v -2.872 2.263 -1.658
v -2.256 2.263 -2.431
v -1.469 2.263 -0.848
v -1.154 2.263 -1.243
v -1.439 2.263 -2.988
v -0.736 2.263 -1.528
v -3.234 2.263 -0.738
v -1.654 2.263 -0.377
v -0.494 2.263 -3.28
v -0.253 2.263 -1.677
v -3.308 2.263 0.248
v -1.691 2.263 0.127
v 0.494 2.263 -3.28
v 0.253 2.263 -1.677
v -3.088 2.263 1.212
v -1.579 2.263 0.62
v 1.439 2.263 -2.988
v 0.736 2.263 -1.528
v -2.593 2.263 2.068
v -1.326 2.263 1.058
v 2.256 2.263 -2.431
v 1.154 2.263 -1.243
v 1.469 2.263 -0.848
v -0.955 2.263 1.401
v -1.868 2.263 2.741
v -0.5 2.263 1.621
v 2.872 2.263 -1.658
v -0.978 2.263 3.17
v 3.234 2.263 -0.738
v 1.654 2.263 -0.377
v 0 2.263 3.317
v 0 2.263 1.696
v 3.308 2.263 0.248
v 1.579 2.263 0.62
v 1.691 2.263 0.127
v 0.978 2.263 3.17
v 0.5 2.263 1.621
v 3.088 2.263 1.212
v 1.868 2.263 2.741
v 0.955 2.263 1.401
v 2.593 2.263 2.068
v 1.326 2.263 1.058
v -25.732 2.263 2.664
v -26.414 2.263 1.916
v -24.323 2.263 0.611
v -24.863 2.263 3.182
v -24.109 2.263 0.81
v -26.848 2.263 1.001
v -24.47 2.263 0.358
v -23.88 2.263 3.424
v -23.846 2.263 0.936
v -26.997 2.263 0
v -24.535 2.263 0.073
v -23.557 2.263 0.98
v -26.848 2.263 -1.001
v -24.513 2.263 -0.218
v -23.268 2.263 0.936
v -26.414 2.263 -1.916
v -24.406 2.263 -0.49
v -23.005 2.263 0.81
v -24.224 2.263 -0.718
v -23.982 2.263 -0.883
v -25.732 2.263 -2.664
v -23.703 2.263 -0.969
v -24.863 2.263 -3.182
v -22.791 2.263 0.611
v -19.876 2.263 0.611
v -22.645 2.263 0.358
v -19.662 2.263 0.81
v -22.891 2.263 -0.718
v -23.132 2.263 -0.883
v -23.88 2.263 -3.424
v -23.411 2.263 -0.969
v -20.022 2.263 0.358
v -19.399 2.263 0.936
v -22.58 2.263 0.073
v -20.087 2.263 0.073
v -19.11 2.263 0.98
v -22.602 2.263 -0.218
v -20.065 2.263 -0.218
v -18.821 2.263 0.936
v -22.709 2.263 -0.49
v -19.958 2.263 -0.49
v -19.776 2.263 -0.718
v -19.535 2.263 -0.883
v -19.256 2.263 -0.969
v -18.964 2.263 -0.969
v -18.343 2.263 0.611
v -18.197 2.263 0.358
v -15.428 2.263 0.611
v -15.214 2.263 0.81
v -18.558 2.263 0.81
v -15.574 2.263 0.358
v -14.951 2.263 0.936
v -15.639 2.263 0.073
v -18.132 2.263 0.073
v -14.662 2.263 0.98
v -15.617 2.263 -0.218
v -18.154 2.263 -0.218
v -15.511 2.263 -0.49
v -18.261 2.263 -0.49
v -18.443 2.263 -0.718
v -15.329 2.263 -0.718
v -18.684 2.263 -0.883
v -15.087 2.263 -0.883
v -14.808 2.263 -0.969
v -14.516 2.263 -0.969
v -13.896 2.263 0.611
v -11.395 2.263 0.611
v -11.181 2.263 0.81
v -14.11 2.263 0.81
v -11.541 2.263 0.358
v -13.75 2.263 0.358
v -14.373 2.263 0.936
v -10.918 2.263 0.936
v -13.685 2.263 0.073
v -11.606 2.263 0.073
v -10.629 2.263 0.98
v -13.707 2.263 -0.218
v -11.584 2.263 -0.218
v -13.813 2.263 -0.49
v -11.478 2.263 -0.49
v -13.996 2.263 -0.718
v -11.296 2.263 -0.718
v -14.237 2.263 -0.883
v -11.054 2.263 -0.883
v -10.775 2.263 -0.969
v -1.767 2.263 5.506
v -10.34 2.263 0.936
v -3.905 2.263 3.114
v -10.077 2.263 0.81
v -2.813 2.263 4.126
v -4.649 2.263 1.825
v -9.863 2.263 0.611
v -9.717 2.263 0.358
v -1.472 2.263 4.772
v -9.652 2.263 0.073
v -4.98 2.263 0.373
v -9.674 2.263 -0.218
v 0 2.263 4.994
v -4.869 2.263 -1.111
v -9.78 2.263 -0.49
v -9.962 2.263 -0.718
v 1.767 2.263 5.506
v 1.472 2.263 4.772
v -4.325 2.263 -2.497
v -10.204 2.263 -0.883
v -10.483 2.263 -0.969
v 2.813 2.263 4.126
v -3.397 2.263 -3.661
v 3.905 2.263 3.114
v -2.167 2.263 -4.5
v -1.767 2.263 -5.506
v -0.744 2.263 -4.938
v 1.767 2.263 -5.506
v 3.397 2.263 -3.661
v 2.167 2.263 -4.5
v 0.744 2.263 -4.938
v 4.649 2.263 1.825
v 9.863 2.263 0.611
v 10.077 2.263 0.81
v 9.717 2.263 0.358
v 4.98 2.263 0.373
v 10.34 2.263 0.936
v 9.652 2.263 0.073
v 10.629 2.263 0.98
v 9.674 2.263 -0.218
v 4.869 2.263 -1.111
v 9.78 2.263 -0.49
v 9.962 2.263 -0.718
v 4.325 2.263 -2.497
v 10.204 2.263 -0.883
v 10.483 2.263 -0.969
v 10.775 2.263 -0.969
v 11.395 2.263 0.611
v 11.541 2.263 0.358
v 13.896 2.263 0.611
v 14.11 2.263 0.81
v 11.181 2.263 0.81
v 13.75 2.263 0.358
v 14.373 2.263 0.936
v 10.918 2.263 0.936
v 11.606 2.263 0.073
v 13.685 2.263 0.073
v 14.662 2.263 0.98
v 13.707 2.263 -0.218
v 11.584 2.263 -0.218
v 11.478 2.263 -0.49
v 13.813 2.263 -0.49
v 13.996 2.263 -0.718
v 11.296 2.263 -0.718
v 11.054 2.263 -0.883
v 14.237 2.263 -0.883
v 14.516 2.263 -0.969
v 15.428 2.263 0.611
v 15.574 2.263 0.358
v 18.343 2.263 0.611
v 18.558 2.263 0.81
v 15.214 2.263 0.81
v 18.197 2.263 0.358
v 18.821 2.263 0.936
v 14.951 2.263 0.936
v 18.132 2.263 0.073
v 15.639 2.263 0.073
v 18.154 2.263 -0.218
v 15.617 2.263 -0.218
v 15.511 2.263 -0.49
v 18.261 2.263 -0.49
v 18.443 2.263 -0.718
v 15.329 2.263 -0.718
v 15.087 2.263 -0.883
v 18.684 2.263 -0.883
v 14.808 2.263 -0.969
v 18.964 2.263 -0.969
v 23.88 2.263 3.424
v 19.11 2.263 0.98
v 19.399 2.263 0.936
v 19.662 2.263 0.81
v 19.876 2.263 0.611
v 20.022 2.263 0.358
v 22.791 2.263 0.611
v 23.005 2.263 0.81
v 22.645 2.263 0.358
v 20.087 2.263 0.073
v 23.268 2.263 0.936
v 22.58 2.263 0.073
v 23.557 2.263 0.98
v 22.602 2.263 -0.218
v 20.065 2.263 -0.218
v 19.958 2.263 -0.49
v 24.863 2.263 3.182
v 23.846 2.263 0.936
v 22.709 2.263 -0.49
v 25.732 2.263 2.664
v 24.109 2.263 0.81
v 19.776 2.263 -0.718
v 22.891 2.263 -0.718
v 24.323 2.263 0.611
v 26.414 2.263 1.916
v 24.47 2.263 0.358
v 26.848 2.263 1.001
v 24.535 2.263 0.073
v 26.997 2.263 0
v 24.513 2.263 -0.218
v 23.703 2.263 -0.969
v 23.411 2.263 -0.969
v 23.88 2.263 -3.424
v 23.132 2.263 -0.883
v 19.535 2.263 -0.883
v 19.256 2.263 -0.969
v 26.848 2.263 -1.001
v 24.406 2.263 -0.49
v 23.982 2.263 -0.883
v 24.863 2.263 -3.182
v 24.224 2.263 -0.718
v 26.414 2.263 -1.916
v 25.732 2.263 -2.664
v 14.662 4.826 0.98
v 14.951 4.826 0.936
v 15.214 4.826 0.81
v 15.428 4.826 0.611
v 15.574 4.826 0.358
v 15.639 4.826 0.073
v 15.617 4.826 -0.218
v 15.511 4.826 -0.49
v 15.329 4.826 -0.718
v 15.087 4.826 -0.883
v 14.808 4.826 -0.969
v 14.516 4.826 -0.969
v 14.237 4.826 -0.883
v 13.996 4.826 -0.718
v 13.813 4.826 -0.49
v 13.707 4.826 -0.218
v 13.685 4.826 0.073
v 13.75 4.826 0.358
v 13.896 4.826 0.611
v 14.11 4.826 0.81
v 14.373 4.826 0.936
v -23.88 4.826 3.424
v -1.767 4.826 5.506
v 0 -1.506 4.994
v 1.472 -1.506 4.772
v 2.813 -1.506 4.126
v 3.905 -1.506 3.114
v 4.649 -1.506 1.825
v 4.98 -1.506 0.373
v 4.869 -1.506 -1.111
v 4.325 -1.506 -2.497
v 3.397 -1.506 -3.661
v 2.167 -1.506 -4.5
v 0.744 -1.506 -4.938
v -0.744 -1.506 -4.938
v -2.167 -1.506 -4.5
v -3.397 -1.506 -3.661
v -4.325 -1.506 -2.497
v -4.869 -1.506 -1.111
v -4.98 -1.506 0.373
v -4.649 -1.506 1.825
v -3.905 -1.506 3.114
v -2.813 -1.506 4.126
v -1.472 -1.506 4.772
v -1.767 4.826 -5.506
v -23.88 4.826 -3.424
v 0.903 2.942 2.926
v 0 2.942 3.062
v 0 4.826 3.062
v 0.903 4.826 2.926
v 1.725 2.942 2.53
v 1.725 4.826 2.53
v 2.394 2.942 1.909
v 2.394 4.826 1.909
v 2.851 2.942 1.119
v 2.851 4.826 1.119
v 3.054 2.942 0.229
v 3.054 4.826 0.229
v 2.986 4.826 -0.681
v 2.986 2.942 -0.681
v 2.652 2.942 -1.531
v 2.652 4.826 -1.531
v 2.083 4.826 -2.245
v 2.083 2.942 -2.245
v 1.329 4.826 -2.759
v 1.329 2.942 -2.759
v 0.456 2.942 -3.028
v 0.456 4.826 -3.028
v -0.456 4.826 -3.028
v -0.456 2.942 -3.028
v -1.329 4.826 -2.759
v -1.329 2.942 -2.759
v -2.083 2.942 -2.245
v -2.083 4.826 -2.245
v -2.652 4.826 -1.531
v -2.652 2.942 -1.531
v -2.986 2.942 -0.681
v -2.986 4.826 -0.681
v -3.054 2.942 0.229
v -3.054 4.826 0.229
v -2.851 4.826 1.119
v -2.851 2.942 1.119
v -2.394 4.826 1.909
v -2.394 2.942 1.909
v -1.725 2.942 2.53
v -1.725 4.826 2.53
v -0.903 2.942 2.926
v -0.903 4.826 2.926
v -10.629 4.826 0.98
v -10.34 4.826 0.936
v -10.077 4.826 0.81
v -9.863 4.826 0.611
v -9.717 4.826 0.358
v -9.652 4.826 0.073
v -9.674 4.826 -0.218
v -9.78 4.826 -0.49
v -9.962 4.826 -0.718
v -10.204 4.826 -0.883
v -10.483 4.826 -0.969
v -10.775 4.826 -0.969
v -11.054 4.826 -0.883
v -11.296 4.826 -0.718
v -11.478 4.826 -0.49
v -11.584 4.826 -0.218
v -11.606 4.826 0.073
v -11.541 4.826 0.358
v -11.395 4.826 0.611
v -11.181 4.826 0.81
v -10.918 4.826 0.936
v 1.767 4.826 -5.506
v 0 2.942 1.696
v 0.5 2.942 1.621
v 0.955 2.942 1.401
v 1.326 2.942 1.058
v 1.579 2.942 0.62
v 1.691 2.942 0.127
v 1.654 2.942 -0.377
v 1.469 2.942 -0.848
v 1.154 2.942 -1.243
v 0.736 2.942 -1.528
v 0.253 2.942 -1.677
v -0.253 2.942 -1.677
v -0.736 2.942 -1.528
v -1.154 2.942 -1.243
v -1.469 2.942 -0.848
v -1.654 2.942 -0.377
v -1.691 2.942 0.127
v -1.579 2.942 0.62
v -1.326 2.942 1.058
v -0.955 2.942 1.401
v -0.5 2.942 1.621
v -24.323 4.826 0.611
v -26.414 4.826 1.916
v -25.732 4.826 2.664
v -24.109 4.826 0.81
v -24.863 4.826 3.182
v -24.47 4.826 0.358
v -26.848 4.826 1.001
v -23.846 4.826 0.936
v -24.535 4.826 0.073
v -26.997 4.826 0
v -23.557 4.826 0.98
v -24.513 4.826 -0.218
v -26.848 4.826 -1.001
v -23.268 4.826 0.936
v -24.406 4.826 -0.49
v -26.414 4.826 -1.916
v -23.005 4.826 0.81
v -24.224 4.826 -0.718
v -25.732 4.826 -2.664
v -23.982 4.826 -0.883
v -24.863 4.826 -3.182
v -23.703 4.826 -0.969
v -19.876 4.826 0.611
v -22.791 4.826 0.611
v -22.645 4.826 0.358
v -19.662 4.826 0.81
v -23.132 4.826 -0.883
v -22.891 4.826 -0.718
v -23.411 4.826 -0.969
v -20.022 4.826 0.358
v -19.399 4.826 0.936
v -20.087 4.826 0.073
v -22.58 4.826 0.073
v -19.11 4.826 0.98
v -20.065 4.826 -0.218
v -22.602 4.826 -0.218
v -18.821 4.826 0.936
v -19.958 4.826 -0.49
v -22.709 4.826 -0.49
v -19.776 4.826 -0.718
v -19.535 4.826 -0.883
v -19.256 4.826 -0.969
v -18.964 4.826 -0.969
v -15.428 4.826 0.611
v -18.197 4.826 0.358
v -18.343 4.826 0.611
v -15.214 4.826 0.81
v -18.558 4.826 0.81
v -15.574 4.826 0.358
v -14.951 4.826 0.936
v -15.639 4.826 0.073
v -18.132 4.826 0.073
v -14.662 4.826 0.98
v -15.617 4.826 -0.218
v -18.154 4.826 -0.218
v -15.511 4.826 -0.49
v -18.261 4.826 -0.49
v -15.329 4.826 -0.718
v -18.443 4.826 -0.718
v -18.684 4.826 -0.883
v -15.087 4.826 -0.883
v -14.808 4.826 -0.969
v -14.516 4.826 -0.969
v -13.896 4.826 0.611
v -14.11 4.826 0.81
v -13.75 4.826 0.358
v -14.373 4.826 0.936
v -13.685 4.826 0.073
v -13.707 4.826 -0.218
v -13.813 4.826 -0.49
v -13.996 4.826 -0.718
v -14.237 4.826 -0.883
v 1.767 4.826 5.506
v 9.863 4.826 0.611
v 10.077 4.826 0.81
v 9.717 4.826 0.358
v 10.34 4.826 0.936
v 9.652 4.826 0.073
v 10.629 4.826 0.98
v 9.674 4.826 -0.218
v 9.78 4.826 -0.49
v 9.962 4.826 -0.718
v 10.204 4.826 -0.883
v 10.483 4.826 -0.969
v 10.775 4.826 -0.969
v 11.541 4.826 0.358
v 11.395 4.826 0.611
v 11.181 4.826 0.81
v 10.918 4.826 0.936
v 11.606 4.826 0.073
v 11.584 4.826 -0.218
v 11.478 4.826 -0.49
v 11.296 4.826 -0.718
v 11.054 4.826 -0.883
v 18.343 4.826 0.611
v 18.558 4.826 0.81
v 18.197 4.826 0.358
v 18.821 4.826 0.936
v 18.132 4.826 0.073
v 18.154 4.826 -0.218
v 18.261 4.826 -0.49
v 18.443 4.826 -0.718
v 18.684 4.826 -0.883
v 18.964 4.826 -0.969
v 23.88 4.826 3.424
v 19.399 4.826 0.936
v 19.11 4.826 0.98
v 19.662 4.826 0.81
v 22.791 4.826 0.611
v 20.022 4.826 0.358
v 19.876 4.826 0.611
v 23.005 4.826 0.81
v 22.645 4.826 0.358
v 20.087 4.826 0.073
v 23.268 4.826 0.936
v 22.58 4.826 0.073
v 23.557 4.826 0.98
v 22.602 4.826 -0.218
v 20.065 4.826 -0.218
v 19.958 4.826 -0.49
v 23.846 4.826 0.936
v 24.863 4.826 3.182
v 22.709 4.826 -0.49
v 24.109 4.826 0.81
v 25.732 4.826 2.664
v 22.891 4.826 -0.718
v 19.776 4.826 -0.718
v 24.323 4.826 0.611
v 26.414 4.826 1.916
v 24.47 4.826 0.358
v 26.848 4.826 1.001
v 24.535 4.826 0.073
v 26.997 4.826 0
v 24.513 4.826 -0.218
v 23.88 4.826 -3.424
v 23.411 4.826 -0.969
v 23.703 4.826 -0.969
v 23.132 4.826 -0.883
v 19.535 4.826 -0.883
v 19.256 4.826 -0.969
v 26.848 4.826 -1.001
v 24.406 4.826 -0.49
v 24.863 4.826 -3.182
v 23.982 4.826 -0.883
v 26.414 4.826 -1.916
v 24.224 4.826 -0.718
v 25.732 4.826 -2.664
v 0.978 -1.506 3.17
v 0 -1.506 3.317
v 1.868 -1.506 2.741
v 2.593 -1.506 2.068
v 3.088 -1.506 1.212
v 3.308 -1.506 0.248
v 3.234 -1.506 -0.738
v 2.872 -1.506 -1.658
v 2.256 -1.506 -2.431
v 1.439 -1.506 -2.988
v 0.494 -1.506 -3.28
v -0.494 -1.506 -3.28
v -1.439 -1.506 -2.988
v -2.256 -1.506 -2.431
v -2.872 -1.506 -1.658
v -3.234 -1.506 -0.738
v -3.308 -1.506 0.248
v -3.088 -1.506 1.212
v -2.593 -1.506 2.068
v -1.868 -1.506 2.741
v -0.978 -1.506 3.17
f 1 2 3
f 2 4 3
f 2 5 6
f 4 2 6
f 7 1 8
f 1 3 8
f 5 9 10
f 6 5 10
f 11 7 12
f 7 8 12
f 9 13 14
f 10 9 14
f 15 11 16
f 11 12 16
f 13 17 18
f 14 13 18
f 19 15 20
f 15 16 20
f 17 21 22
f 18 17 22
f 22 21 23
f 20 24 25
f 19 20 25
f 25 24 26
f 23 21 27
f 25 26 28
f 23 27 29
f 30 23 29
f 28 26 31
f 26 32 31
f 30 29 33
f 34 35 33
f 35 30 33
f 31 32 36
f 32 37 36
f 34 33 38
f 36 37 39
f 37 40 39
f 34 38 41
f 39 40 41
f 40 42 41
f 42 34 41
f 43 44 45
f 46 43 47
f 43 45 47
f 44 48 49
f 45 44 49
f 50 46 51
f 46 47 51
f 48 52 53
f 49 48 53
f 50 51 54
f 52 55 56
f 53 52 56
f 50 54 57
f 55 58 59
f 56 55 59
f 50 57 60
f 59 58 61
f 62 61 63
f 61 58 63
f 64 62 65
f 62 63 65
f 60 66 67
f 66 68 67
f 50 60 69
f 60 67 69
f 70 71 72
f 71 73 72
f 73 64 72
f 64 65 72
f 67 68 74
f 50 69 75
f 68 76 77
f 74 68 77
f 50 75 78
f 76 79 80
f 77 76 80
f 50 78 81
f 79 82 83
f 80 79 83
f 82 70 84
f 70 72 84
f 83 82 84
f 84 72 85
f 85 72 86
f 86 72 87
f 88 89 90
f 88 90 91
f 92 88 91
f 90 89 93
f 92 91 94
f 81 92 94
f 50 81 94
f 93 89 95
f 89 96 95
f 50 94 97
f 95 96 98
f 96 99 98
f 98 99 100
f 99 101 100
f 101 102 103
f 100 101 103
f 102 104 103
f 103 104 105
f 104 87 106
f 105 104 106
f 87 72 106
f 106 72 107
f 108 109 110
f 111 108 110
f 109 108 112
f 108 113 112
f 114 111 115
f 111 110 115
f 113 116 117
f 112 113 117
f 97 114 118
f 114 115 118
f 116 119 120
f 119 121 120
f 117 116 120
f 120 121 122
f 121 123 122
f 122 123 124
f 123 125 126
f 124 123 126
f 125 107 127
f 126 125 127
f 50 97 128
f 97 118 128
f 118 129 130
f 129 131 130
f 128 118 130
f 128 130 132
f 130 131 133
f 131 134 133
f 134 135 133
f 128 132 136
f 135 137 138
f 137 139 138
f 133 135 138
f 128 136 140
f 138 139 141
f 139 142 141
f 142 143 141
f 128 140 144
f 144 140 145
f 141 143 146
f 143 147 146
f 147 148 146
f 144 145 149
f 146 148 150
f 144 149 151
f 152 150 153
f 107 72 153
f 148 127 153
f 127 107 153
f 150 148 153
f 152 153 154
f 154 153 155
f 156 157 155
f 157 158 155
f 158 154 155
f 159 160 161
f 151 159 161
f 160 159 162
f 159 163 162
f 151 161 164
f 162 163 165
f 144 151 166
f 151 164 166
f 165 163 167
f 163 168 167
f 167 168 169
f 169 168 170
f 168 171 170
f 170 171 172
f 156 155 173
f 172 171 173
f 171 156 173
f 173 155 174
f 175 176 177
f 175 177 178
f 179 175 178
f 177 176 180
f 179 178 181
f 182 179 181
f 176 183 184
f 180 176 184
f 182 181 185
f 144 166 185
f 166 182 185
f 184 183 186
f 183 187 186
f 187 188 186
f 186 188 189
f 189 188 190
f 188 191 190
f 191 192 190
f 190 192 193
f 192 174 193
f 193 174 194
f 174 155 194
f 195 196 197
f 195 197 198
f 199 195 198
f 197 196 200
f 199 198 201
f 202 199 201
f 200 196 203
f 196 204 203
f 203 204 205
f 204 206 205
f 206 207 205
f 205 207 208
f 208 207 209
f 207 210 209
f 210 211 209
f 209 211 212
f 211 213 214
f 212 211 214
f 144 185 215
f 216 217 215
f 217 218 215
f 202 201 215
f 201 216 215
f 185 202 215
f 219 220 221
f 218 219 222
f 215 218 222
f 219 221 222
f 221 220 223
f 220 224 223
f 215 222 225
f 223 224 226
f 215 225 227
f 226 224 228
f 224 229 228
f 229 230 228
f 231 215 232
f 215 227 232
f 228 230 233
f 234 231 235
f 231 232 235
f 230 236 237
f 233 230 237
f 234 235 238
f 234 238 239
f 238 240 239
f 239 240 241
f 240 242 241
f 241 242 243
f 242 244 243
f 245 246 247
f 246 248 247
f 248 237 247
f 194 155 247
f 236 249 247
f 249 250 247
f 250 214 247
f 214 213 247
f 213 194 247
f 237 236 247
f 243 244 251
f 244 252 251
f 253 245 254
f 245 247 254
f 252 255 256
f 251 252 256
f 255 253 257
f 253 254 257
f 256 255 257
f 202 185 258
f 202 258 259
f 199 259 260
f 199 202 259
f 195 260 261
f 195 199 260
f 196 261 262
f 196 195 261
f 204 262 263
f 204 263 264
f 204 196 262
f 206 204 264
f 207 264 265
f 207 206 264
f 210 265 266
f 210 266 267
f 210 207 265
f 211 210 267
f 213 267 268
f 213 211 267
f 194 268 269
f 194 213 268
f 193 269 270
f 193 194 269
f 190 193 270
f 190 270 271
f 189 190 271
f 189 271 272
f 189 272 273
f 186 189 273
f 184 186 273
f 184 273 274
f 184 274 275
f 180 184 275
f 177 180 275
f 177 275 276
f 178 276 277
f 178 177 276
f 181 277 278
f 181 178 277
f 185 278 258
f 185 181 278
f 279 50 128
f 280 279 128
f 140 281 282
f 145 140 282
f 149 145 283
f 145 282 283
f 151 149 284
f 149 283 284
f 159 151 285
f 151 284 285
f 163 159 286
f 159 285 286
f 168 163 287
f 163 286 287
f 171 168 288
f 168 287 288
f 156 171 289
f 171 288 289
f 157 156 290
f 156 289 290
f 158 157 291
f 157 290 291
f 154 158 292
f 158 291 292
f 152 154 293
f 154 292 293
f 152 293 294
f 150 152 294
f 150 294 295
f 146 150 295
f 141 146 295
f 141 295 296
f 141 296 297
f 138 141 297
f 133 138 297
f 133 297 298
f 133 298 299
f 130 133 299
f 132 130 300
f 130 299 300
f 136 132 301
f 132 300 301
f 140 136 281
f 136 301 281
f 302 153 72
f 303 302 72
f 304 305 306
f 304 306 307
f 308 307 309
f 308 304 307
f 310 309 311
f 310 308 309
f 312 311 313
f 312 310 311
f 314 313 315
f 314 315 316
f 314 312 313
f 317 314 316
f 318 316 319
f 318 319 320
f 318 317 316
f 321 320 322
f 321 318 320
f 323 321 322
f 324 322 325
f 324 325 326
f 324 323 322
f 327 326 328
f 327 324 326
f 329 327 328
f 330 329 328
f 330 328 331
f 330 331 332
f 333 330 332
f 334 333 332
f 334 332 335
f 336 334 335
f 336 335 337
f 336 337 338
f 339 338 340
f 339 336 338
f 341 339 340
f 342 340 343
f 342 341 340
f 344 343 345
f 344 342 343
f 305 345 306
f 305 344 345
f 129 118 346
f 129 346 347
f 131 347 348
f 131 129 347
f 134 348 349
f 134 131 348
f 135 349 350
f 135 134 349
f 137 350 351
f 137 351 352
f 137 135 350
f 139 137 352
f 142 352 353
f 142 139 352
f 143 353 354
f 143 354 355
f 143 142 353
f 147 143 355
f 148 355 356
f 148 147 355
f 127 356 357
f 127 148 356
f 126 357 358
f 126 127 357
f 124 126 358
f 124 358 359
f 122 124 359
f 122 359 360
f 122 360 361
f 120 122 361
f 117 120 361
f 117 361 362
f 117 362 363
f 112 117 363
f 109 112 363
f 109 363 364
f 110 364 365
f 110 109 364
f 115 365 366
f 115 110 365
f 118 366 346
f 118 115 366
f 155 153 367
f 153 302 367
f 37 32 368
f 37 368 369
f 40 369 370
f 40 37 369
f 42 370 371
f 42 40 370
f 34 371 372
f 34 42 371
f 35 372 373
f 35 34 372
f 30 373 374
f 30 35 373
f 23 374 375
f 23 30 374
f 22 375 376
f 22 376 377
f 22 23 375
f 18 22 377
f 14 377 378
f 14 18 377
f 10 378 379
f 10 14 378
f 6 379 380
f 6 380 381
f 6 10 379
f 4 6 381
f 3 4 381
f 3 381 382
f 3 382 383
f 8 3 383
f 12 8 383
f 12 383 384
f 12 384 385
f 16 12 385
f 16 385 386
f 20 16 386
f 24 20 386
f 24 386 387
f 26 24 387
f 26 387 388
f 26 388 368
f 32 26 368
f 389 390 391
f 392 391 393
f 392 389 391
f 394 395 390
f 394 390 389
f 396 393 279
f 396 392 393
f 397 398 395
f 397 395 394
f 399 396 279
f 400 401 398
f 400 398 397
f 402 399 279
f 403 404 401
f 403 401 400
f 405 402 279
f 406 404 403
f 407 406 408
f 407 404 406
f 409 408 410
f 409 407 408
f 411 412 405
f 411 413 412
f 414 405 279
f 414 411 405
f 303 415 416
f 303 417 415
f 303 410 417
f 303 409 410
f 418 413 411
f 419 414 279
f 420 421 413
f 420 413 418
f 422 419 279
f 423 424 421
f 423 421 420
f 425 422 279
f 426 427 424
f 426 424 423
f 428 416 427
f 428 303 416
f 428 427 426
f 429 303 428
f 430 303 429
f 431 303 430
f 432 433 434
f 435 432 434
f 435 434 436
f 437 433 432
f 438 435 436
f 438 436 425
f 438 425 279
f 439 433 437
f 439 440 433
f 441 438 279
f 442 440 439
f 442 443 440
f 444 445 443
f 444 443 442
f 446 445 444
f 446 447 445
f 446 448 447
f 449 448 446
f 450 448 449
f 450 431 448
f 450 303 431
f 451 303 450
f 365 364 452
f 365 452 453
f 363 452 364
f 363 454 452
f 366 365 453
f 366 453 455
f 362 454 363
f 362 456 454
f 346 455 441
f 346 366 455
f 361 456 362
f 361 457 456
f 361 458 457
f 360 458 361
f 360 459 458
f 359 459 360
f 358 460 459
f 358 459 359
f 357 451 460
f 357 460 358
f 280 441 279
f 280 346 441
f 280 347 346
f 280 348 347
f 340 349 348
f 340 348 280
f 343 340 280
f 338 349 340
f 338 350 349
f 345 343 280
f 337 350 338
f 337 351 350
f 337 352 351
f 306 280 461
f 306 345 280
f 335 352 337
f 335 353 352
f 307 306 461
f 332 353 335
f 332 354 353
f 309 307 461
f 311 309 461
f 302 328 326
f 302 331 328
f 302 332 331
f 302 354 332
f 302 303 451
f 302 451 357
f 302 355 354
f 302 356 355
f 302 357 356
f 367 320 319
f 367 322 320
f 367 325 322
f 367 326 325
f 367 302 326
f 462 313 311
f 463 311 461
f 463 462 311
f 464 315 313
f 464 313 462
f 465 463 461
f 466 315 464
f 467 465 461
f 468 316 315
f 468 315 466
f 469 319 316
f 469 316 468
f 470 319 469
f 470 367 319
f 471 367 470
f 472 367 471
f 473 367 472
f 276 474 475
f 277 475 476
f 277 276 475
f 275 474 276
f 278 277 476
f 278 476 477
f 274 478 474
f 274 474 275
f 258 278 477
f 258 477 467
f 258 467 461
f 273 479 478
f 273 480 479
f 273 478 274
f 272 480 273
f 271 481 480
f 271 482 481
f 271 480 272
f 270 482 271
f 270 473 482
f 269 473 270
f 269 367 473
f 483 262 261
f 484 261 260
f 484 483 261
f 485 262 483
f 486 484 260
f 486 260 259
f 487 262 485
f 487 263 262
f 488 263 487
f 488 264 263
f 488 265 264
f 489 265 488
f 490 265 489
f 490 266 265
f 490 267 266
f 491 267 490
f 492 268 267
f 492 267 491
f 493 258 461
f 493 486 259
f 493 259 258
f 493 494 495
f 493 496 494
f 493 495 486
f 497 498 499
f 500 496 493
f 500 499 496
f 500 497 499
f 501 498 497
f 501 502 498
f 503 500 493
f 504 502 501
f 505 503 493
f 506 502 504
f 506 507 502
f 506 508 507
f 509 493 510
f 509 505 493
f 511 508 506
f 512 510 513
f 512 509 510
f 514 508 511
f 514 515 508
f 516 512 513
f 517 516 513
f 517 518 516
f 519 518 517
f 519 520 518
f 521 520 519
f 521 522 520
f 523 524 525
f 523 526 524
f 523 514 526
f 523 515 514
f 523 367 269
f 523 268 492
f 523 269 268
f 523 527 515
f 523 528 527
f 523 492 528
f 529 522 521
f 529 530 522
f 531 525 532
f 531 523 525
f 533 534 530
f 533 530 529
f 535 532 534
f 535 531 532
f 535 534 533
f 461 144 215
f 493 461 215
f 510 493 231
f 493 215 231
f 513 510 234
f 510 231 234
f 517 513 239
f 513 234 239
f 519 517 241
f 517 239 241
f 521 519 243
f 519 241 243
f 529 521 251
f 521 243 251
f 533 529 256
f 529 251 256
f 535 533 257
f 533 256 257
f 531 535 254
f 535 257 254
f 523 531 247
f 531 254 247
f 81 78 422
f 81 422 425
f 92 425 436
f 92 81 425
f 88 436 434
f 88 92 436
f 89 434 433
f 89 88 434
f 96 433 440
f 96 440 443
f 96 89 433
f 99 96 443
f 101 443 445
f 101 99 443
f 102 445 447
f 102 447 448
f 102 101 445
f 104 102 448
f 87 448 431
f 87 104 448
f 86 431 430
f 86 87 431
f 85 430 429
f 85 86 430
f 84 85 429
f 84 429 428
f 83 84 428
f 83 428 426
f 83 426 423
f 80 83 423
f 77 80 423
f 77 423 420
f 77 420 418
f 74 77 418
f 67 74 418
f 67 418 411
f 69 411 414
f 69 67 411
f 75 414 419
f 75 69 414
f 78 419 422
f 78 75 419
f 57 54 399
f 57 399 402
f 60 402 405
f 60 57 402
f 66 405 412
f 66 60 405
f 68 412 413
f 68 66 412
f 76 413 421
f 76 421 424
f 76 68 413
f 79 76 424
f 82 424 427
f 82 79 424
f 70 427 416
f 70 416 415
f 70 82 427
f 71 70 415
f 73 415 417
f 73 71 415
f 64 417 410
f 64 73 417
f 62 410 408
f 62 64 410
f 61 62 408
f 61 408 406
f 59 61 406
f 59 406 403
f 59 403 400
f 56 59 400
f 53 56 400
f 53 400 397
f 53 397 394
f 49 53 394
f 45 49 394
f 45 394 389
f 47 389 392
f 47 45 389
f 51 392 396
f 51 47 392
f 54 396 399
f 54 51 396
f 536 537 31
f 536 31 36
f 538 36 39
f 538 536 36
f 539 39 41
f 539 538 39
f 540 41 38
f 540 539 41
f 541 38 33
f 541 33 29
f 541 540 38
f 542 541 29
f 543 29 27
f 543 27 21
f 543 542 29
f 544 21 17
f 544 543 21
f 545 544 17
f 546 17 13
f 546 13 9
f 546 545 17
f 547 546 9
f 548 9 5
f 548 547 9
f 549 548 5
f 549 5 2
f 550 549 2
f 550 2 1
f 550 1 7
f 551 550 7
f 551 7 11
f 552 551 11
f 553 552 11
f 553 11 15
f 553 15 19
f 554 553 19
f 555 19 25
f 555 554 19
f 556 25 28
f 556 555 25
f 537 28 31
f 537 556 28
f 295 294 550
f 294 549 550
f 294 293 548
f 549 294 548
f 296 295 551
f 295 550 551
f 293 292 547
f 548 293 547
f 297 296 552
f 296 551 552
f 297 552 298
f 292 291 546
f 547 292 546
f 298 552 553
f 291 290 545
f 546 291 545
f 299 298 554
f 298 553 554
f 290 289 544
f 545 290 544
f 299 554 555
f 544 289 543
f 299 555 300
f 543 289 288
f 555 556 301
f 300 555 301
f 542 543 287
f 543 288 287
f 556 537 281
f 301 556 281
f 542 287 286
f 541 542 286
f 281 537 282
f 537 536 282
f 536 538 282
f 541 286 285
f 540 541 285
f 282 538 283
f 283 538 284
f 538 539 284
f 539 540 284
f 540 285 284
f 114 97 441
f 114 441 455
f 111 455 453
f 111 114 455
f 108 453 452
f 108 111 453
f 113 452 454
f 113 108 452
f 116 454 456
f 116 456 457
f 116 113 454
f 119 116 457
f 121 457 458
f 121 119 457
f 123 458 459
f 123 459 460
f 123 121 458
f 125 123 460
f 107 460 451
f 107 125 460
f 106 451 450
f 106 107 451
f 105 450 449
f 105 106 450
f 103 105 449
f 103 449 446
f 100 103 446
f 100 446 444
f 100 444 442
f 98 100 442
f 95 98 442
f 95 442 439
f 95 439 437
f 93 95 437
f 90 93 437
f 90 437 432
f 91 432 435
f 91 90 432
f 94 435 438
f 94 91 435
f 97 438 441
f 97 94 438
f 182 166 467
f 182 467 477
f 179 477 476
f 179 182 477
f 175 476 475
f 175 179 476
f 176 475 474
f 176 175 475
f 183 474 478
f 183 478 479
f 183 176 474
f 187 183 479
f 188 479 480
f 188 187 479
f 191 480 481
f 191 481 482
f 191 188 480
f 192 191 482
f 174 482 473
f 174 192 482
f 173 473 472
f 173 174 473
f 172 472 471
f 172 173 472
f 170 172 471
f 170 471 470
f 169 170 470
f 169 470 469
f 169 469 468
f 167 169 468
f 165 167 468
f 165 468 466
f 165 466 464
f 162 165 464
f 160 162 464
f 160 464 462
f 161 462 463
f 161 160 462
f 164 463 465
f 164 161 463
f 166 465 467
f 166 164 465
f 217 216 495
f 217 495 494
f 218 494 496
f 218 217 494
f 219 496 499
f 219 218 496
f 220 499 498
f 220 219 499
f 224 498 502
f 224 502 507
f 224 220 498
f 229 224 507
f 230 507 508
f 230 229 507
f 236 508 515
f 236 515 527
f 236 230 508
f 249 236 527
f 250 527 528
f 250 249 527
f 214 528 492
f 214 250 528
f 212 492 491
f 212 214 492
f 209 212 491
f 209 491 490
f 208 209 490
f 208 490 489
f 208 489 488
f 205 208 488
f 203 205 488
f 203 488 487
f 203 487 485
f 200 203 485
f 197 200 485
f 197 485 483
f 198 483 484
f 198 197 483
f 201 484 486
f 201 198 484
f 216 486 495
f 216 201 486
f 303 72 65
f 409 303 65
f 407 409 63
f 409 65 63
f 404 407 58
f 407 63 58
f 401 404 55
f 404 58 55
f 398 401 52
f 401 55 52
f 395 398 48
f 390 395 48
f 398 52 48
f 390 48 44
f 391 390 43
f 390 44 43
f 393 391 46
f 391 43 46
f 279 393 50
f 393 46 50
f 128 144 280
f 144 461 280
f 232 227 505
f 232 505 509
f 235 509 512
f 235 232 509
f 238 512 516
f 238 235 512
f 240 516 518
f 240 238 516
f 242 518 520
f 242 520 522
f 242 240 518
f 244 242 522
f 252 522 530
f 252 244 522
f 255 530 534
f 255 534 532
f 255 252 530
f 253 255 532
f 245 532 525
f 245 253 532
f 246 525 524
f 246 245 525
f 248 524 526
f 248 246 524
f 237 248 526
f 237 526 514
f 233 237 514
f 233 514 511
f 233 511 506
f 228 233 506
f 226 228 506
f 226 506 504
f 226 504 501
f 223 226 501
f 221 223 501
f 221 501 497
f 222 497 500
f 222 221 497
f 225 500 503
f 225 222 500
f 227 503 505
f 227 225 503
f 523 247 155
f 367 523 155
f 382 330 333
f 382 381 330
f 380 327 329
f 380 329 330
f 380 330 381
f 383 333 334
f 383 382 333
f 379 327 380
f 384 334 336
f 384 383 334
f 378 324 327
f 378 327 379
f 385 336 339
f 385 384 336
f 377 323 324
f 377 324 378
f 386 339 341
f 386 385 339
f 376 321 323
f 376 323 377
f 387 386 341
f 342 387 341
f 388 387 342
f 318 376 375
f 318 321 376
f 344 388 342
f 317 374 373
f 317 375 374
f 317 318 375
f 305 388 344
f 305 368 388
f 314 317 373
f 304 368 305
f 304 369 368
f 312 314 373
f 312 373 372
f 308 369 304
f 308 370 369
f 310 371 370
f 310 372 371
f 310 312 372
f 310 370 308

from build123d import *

# Parameters (mm, degrees)
SKETCH1_R           = 3.3655
SKETCH1_R_2         = 2.2352
BOSS_EXTRUDE1_DEPTH = 2.54
SKETCH2_R           = 0.6604
SKETCH2_R_2         = 2.31775
SKETCH2_R_3         = 3.3655
SKETCH2_R_4         = 2.2352
SKETCH2_R_5         = 1.143
BOSS_EXTRUDE2_DEPTH = 1.7272
FILLET1_R           = 12.7
CUT_EXTRUDE1_START  = -1.27
SKETCH3_R           = 2.06375
SKETCH3_R_2         = 1.143
CUT_EXTRUDE1_DEPTH  = 1.27
SCALE1_SCALE        = 1.483924155


with BuildPart() as part:
    # Sketch1 → Boss-Extrude1 (new body)
    with BuildSketch(Plane(origin=(0, 0, 0), x_dir=(1, 0, 0), z_dir=(0, 1, 0))):
        with Locations(Location((0, 0, 0), (0, 0, 270))):
            Circle(SKETCH1_R)
        with Locations(Location((0, 0, 0), (0, 0, 270))):
            Circle(SKETCH1_R_2, mode=Mode.SUBTRACT)
    extrude(amount=BOSS_EXTRUDE1_DEPTH)

    # Sketch2 → Boss-Extrude2 (add)
    # profile 1 of 7: a face of its own
    with BuildSketch(Plane(origin=(0, 2.54, 0), x_dir=(1, 0, 0), z_dir=(0, 1, 0))):
        with BuildLine():
            ThreePointArc((-0.713521748, -3.755518873), (-3.8227, 0), (-0.713521748, 3.755518873))
            Line((-0.713521748, 3.755518873), (-16.092265178, 2.307544345))
            ThreePointArc((-16.092265178, 2.307544345), (-14.314807913, 1.713991165), (-13.55725, 0))
            ThreePointArc((-13.55725, 0), (-14.314807913, -1.713991165), (-16.092265178, -2.307544345))
            Line((-16.092265178, -2.307544345), (-0.713521748, -3.755518873))
        make_face()
        with Locations(Location((-12.8778, 0, 0), (0, 0, 270))):
            Circle(SKETCH2_R, mode=Mode.SUBTRACT)
        with Locations(Location((-9.8806, 0, 0), (0, 0, 270))):
            Circle(SKETCH2_R, mode=Mode.SUBTRACT)
        with Locations(Location((-7.1628, 0, 0), (0, 0, 270))):
            Circle(SKETCH2_R, mode=Mode.SUBTRACT)
    # profile 2 of 7: a face of its own
    with BuildSketch(Plane(origin=(0, 2.54, 0), x_dir=(1, 0, 0), z_dir=(0, 1, 0))):
        with Locations((-15.875, 0)):
            Circle(SKETCH2_R_2)
        with Locations(Location((-15.875, 0, 0), (0, 0, 270))):
            Circle(SKETCH2_R, mode=Mode.SUBTRACT)
    # profile 3 of 7: a face of its own
    with BuildSketch(Plane(origin=(0, 2.54, 0), x_dir=(1, 0, 0), z_dir=(0, 1, 0))):
        with BuildLine():
            Line((16.092265178, 2.307544345), (0.713521748, 3.755518873))
            ThreePointArc((0.713521748, 3.755518873), (2.944538578, 2.437771083), (3.8227, 0))
            ThreePointArc((3.8227, 0), (2.944538578, -2.437771083), (0.713521748, -3.755518873))
            Line((0.713521748, -3.755518873), (16.092265178, -2.307544345))
            ThreePointArc((16.092265178, -2.307544345), (13.55725, 0), (16.092265178, 2.307544345))
        make_face()
        with Locations(Location((7.1628, 0, 0), (0, 0, 270))):
            Circle(SKETCH2_R, mode=Mode.SUBTRACT)
        with Locations(Location((9.8806, 0, 0), (0, 0, 270))):
            Circle(SKETCH2_R, mode=Mode.SUBTRACT)
        with Locations(Location((12.8778, 0, 0), (0, 0, 270))):
            Circle(SKETCH2_R, mode=Mode.SUBTRACT)
    # profile 4 of 7: a face of its own
    with BuildSketch(Plane(origin=(0, 2.54, 0), x_dir=(1, 0, 0), z_dir=(0, 1, 0))):
        with Locations((15.875, 0)):
            Circle(SKETCH2_R_2)
        with Locations(Location((15.875, 0, 0), (0, 0, 270))):
            Circle(SKETCH2_R, mode=Mode.SUBTRACT)
    # profile 5 of 7: a face of its own
    with BuildSketch(Plane(origin=(0, 2.54, 0), x_dir=(1, 0, 0), z_dir=(0, 1, 0))):
        with BuildLine():
            Line((0.713521748, 3.755518873), (0, 3.8227))
            Line((0, 3.8227), (-0.713521748, 3.755518873))
            ThreePointArc((-0.713521748, 3.755518873), (-3.8227, 0), (-0.713521748, -3.755518873))
            Line((-0.713521748, -3.755518873), (0, -3.8227))
            Line((0, -3.8227), (0.713521748, -3.755518873))
            ThreePointArc((0.713521748, -3.755518873), (2.944538578, -2.437771083), (3.8227, 0))
            ThreePointArc((3.8227, 0), (2.944538578, 2.437771083), (0.713521748, 3.755518873))
        make_face()
        with Locations(Location((0, 0, 0), (0, 0, 270))):
            Circle(SKETCH2_R_3, mode=Mode.SUBTRACT)
    # profile 6 of 7: a face of its own
    with BuildSketch(Plane(origin=(0, 2.54, 0), x_dir=(1, 0, 0), z_dir=(0, 1, 0))):
        with Locations(Location((0, 0, 0), (0, 0, 270))):
            Circle(SKETCH2_R_3)
        with Locations(Location((0, 0, 0), (0, 0, 270))):
            Circle(SKETCH2_R_4, mode=Mode.SUBTRACT)
    # profile 7 of 7: a face of its own
    with BuildSketch(Plane(origin=(0, 2.54, 0), x_dir=(1, 0, 0), z_dir=(0, 1, 0))):
        with Locations(Location((0, 0, 0), (0, 0, 270))):
            Circle(SKETCH2_R_4)
        with Locations(Location((0, 0, 0), (0, 0, 270))):
            Circle(SKETCH2_R_5, mode=Mode.SUBTRACT)
    extrude(amount=BOSS_EXTRUDE2_DEPTH)

    # Fillet1
    fillet1_edges = [part.edges().sort_by_distance(p)[0] for p in [
        (0, 3.4036, -3.8227),
        (0, 3.4036, 3.8227),
    ]]
    fillet(fillet1_edges, radius=FILLET1_R)

    # Sketch3 → Cut-Extrude1 (cut)
    with BuildSketch(Plane(origin=(0, 4.2672, 0), x_dir=(1, 0, 0), z_dir=(0, 1, 0)).offset(CUT_EXTRUDE1_START)):
        with Locations(Location((0, 0, 0), (0, 0, 270))):
            Circle(SKETCH3_R)
        with Locations(Location((0, 0, 0), (0, 0, 270))):
            Circle(SKETCH3_R_2, mode=Mode.SUBTRACT)
    extrude(amount=CUT_EXTRUDE1_DEPTH, mode=Mode.SUBTRACT)


with BuildPart() as part_1:
    # Scale1: scaled about (0, 3.112125365, 0)
    add(part.part.scale(SCALE1_SCALE).moved(Location((0, -1.506032637, 0))))


solid = part_1.part
